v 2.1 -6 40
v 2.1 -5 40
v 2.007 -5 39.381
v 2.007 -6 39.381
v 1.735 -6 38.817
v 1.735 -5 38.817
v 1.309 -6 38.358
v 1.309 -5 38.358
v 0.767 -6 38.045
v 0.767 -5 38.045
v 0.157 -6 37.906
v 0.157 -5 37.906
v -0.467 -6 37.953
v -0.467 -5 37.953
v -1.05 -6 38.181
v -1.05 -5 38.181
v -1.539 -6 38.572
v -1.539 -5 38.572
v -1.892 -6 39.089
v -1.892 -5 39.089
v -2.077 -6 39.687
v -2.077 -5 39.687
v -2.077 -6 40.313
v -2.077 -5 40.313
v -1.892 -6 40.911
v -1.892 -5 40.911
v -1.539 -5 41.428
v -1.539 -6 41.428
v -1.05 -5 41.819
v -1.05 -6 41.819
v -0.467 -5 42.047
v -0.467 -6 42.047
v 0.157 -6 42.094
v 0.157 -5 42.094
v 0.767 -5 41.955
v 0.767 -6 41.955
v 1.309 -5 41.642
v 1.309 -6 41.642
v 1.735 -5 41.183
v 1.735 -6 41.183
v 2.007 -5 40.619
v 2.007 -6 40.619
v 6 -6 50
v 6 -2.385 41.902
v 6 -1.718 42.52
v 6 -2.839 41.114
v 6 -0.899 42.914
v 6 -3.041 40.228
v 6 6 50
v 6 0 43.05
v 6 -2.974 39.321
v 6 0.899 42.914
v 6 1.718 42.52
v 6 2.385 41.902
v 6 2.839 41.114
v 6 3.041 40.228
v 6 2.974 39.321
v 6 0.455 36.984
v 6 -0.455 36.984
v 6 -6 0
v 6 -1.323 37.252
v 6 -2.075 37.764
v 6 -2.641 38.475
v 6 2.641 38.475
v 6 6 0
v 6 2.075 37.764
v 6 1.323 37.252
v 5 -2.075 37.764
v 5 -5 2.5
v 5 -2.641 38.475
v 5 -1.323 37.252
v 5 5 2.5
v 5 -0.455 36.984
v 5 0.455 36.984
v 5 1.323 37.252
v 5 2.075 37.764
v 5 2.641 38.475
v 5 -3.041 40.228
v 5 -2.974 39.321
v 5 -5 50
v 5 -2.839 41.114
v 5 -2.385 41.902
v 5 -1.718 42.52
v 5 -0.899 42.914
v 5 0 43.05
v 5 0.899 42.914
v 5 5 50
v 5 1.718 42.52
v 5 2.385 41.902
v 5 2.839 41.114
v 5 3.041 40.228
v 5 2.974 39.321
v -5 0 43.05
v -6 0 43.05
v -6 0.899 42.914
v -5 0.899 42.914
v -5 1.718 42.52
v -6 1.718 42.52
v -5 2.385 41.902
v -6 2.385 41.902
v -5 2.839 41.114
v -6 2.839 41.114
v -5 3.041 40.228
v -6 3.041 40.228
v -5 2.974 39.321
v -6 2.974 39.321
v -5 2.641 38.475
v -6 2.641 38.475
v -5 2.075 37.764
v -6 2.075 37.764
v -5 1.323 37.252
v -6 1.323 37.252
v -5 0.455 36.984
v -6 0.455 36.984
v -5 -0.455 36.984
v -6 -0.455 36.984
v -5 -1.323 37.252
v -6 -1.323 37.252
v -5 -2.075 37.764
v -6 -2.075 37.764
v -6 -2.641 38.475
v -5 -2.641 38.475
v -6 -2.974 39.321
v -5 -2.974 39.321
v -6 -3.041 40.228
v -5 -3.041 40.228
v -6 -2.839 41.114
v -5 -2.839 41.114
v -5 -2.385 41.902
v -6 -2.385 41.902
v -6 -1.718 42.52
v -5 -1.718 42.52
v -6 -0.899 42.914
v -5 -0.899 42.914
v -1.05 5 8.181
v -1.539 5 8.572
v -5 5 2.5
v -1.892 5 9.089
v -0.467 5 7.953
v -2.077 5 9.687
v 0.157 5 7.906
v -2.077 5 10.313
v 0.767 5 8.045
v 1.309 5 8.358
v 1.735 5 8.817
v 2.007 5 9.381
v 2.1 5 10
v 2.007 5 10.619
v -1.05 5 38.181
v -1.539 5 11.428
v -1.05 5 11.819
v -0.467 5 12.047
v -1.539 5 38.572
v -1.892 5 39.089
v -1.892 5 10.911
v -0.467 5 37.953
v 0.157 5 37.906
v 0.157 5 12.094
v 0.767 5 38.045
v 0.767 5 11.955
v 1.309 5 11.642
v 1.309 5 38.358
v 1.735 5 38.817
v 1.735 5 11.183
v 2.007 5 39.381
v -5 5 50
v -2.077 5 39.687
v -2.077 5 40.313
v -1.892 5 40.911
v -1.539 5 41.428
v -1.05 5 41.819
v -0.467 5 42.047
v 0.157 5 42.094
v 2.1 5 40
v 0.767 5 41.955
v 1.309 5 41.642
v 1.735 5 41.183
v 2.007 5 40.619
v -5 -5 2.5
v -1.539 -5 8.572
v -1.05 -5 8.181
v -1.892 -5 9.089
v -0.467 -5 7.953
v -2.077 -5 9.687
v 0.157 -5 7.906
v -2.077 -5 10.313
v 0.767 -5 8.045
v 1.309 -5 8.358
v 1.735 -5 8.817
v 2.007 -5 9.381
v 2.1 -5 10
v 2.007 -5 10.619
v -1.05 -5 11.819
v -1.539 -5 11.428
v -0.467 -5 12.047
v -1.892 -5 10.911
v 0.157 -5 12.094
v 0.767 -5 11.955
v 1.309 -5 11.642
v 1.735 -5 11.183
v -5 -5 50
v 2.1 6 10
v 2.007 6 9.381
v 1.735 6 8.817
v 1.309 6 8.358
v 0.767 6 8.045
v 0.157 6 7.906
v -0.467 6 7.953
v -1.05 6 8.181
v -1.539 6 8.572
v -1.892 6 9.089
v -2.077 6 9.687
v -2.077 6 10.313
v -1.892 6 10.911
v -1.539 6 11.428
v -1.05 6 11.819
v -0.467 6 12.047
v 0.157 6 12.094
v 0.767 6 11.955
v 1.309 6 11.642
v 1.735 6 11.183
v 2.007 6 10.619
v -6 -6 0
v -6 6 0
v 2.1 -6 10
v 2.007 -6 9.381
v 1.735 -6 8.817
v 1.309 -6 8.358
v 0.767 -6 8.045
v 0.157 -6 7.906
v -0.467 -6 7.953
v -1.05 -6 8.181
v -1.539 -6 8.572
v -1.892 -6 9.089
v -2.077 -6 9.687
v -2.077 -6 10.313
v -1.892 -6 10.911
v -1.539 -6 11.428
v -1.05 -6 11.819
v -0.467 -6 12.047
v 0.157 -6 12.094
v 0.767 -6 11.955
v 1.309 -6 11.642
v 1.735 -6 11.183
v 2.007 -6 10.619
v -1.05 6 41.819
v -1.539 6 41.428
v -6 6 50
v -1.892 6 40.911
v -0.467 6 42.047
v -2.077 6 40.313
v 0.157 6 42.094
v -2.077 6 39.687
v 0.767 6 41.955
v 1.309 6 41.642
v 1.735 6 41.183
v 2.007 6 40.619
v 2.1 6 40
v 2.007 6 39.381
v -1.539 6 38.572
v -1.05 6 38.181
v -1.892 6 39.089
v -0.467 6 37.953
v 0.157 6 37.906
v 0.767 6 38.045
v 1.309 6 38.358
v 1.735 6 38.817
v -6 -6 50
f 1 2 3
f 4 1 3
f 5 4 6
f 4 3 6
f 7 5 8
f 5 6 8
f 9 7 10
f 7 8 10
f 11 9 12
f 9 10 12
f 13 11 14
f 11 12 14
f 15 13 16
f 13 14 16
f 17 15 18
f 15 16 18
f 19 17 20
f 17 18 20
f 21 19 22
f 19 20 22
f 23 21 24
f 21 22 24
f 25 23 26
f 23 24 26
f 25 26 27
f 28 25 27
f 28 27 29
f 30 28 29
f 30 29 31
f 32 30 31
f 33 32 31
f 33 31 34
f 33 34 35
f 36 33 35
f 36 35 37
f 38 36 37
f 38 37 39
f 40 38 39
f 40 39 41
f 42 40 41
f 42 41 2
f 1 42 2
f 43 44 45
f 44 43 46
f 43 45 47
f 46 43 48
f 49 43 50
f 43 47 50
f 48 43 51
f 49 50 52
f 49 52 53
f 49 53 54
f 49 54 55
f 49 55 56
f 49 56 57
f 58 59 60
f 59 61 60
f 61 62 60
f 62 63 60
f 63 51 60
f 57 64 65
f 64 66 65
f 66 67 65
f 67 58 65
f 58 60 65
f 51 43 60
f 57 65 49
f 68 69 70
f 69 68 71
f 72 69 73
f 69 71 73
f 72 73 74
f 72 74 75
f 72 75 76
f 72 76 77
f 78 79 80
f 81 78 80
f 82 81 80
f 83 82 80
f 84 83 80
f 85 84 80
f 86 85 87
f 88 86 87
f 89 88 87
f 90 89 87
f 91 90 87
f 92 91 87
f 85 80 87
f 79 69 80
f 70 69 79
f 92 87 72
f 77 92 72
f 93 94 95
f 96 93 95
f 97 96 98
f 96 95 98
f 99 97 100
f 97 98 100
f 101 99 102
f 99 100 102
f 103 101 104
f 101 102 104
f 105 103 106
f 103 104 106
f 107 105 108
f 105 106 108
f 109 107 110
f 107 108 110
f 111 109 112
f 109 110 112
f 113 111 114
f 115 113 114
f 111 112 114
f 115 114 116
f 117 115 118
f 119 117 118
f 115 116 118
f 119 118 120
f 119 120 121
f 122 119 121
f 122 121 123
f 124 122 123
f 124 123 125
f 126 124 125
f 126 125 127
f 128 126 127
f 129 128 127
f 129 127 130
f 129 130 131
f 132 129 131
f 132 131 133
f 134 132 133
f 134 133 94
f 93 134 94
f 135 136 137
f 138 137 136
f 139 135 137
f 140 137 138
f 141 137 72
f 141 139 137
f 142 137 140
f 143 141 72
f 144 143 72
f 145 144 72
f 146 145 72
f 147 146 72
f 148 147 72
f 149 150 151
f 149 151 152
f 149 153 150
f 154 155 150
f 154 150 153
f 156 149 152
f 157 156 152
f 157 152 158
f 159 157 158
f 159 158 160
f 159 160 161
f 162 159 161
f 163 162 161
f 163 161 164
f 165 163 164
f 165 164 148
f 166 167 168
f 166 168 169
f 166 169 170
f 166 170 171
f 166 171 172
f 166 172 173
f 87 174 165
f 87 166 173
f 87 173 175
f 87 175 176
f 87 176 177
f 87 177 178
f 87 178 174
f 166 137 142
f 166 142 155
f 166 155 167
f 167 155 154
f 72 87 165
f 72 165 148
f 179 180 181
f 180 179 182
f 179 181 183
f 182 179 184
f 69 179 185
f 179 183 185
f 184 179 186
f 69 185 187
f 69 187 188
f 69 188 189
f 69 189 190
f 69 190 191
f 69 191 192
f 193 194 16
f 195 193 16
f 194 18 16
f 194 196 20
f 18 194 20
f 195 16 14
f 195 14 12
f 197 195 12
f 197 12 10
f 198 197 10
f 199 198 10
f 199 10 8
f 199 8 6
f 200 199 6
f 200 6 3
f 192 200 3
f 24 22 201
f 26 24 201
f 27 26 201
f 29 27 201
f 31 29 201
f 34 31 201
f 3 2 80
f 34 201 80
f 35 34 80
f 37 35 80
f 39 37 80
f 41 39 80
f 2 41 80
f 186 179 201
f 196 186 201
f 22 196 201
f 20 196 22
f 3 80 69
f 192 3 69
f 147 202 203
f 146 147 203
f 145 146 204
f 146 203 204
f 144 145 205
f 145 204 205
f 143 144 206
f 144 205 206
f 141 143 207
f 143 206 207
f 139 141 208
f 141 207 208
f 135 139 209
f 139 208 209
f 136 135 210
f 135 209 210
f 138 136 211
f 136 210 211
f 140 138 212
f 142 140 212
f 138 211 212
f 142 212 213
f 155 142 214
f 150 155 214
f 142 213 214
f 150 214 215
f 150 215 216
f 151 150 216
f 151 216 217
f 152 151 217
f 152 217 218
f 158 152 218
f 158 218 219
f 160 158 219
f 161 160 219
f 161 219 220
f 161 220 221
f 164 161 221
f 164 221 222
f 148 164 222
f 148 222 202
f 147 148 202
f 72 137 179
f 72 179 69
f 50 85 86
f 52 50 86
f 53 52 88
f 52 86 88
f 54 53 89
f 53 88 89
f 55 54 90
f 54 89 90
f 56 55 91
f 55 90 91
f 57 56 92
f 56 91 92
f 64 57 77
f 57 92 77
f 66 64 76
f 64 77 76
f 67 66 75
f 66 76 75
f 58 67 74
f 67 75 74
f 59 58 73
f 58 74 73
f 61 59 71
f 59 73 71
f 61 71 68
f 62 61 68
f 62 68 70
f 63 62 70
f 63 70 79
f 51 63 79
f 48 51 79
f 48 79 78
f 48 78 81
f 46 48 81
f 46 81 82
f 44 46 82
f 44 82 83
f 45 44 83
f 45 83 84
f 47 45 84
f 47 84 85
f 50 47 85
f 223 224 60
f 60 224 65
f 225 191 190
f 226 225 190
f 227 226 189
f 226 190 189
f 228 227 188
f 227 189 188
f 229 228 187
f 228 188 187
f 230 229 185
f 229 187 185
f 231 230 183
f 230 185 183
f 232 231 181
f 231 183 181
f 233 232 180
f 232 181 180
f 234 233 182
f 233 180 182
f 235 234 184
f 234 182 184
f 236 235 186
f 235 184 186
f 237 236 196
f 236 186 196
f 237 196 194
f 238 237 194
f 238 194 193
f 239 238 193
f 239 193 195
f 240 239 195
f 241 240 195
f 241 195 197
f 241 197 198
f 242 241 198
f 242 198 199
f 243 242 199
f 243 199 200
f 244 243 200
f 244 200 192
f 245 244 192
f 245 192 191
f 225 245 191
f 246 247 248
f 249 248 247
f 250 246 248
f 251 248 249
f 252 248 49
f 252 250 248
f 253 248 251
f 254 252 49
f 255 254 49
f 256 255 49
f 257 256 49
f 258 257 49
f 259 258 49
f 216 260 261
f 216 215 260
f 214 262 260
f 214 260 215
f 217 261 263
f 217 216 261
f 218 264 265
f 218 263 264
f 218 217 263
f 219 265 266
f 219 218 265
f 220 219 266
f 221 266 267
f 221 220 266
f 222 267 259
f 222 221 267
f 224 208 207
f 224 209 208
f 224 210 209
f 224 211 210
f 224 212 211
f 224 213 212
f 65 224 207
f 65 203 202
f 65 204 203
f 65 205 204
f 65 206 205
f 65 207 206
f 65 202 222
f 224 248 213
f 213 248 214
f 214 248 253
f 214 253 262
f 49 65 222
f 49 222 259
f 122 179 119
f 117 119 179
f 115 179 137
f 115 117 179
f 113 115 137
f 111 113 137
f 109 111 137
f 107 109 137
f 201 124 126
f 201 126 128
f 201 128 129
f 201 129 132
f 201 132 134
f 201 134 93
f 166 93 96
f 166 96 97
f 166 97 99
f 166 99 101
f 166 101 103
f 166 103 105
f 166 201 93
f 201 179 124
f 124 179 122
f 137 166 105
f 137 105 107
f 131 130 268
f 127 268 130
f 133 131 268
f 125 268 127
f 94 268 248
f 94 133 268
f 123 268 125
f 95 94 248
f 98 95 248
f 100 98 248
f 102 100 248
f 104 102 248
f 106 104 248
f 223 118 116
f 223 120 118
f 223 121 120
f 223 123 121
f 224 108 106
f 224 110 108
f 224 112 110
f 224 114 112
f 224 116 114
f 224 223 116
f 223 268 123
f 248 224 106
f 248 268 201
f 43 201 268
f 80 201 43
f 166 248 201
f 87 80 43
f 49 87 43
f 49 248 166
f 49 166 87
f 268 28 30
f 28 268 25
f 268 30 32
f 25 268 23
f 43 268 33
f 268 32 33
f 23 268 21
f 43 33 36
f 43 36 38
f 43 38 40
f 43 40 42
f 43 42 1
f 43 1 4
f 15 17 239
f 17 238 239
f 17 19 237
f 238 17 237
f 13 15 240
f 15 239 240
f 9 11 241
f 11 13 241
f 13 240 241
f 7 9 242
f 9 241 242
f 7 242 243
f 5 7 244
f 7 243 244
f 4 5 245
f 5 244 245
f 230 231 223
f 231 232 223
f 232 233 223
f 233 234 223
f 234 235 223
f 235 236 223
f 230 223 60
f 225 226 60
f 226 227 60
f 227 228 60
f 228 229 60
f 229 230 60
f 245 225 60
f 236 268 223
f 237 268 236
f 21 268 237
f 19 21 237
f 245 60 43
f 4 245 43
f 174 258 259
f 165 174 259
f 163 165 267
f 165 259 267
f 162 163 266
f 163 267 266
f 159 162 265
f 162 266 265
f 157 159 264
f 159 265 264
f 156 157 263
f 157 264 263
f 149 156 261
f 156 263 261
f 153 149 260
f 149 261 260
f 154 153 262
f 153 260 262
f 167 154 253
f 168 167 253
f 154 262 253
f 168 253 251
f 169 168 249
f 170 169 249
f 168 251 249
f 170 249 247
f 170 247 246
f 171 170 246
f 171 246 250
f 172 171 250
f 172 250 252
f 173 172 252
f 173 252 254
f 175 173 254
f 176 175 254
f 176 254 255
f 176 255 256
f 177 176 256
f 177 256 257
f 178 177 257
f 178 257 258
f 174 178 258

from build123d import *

# Parameters (mm, degrees)
SKETCH_1_W          = 12
SKETCH_1_H          = 12
EXTRUDE_1_DEPTH     = 50
SKETCH_2_W          = 10
SKETCH_2_H          = 10
CUT_EXTRUDE_1_DEPTH = 47.5
SKETCH_3_R          = 2.1
CUT_EXTRUDE_2_DEPTH = 47.5
SKETCH_5_R          = 3.05
CUT_EXTRUDE_4_DEPTH = 47.5


with BuildPart() as part:
    # ｽｹｯﾁ1 → ﾎﾞｽ - 押し出し1 (new body)
    with BuildSketch(Plane.XY):
        Rectangle(SKETCH_1_W, SKETCH_1_H)
    extrude(amount=EXTRUDE_1_DEPTH)

    # ｽｹｯﾁ2 → ｶｯﾄ - 押し出し1 (cut)
    with BuildSketch(Plane.XY.offset(50)):
        Rectangle(SKETCH_2_W, SKETCH_2_H)
    extrude(amount=-CUT_EXTRUDE_1_DEPTH, mode=Mode.SUBTRACT)

    # ｽｹｯﾁ3 → ｶｯﾄ - 押し出し2 (cut)
    with BuildSketch(Plane(origin=(0, 6, 0), x_dir=(1, 0, 0), z_dir=(0, 1, 0))):
        with Locations((0, -10)):
            Circle(SKETCH_3_R)
        with Locations((0, -40)):
            Circle(SKETCH_3_R)
    extrude(amount=-CUT_EXTRUDE_2_DEPTH, mode=Mode.SUBTRACT)

    # ｽｹｯﾁ5 → ｶｯﾄ - 押し出し4 (cut)
    with BuildSketch(Plane.ZY.offset(6)):
        with Locations((40, 0)):
            Circle(SKETCH_5_R)
    extrude(amount=-CUT_EXTRUDE_4_DEPTH, mode=Mode.SUBTRACT)


solid = part.part
